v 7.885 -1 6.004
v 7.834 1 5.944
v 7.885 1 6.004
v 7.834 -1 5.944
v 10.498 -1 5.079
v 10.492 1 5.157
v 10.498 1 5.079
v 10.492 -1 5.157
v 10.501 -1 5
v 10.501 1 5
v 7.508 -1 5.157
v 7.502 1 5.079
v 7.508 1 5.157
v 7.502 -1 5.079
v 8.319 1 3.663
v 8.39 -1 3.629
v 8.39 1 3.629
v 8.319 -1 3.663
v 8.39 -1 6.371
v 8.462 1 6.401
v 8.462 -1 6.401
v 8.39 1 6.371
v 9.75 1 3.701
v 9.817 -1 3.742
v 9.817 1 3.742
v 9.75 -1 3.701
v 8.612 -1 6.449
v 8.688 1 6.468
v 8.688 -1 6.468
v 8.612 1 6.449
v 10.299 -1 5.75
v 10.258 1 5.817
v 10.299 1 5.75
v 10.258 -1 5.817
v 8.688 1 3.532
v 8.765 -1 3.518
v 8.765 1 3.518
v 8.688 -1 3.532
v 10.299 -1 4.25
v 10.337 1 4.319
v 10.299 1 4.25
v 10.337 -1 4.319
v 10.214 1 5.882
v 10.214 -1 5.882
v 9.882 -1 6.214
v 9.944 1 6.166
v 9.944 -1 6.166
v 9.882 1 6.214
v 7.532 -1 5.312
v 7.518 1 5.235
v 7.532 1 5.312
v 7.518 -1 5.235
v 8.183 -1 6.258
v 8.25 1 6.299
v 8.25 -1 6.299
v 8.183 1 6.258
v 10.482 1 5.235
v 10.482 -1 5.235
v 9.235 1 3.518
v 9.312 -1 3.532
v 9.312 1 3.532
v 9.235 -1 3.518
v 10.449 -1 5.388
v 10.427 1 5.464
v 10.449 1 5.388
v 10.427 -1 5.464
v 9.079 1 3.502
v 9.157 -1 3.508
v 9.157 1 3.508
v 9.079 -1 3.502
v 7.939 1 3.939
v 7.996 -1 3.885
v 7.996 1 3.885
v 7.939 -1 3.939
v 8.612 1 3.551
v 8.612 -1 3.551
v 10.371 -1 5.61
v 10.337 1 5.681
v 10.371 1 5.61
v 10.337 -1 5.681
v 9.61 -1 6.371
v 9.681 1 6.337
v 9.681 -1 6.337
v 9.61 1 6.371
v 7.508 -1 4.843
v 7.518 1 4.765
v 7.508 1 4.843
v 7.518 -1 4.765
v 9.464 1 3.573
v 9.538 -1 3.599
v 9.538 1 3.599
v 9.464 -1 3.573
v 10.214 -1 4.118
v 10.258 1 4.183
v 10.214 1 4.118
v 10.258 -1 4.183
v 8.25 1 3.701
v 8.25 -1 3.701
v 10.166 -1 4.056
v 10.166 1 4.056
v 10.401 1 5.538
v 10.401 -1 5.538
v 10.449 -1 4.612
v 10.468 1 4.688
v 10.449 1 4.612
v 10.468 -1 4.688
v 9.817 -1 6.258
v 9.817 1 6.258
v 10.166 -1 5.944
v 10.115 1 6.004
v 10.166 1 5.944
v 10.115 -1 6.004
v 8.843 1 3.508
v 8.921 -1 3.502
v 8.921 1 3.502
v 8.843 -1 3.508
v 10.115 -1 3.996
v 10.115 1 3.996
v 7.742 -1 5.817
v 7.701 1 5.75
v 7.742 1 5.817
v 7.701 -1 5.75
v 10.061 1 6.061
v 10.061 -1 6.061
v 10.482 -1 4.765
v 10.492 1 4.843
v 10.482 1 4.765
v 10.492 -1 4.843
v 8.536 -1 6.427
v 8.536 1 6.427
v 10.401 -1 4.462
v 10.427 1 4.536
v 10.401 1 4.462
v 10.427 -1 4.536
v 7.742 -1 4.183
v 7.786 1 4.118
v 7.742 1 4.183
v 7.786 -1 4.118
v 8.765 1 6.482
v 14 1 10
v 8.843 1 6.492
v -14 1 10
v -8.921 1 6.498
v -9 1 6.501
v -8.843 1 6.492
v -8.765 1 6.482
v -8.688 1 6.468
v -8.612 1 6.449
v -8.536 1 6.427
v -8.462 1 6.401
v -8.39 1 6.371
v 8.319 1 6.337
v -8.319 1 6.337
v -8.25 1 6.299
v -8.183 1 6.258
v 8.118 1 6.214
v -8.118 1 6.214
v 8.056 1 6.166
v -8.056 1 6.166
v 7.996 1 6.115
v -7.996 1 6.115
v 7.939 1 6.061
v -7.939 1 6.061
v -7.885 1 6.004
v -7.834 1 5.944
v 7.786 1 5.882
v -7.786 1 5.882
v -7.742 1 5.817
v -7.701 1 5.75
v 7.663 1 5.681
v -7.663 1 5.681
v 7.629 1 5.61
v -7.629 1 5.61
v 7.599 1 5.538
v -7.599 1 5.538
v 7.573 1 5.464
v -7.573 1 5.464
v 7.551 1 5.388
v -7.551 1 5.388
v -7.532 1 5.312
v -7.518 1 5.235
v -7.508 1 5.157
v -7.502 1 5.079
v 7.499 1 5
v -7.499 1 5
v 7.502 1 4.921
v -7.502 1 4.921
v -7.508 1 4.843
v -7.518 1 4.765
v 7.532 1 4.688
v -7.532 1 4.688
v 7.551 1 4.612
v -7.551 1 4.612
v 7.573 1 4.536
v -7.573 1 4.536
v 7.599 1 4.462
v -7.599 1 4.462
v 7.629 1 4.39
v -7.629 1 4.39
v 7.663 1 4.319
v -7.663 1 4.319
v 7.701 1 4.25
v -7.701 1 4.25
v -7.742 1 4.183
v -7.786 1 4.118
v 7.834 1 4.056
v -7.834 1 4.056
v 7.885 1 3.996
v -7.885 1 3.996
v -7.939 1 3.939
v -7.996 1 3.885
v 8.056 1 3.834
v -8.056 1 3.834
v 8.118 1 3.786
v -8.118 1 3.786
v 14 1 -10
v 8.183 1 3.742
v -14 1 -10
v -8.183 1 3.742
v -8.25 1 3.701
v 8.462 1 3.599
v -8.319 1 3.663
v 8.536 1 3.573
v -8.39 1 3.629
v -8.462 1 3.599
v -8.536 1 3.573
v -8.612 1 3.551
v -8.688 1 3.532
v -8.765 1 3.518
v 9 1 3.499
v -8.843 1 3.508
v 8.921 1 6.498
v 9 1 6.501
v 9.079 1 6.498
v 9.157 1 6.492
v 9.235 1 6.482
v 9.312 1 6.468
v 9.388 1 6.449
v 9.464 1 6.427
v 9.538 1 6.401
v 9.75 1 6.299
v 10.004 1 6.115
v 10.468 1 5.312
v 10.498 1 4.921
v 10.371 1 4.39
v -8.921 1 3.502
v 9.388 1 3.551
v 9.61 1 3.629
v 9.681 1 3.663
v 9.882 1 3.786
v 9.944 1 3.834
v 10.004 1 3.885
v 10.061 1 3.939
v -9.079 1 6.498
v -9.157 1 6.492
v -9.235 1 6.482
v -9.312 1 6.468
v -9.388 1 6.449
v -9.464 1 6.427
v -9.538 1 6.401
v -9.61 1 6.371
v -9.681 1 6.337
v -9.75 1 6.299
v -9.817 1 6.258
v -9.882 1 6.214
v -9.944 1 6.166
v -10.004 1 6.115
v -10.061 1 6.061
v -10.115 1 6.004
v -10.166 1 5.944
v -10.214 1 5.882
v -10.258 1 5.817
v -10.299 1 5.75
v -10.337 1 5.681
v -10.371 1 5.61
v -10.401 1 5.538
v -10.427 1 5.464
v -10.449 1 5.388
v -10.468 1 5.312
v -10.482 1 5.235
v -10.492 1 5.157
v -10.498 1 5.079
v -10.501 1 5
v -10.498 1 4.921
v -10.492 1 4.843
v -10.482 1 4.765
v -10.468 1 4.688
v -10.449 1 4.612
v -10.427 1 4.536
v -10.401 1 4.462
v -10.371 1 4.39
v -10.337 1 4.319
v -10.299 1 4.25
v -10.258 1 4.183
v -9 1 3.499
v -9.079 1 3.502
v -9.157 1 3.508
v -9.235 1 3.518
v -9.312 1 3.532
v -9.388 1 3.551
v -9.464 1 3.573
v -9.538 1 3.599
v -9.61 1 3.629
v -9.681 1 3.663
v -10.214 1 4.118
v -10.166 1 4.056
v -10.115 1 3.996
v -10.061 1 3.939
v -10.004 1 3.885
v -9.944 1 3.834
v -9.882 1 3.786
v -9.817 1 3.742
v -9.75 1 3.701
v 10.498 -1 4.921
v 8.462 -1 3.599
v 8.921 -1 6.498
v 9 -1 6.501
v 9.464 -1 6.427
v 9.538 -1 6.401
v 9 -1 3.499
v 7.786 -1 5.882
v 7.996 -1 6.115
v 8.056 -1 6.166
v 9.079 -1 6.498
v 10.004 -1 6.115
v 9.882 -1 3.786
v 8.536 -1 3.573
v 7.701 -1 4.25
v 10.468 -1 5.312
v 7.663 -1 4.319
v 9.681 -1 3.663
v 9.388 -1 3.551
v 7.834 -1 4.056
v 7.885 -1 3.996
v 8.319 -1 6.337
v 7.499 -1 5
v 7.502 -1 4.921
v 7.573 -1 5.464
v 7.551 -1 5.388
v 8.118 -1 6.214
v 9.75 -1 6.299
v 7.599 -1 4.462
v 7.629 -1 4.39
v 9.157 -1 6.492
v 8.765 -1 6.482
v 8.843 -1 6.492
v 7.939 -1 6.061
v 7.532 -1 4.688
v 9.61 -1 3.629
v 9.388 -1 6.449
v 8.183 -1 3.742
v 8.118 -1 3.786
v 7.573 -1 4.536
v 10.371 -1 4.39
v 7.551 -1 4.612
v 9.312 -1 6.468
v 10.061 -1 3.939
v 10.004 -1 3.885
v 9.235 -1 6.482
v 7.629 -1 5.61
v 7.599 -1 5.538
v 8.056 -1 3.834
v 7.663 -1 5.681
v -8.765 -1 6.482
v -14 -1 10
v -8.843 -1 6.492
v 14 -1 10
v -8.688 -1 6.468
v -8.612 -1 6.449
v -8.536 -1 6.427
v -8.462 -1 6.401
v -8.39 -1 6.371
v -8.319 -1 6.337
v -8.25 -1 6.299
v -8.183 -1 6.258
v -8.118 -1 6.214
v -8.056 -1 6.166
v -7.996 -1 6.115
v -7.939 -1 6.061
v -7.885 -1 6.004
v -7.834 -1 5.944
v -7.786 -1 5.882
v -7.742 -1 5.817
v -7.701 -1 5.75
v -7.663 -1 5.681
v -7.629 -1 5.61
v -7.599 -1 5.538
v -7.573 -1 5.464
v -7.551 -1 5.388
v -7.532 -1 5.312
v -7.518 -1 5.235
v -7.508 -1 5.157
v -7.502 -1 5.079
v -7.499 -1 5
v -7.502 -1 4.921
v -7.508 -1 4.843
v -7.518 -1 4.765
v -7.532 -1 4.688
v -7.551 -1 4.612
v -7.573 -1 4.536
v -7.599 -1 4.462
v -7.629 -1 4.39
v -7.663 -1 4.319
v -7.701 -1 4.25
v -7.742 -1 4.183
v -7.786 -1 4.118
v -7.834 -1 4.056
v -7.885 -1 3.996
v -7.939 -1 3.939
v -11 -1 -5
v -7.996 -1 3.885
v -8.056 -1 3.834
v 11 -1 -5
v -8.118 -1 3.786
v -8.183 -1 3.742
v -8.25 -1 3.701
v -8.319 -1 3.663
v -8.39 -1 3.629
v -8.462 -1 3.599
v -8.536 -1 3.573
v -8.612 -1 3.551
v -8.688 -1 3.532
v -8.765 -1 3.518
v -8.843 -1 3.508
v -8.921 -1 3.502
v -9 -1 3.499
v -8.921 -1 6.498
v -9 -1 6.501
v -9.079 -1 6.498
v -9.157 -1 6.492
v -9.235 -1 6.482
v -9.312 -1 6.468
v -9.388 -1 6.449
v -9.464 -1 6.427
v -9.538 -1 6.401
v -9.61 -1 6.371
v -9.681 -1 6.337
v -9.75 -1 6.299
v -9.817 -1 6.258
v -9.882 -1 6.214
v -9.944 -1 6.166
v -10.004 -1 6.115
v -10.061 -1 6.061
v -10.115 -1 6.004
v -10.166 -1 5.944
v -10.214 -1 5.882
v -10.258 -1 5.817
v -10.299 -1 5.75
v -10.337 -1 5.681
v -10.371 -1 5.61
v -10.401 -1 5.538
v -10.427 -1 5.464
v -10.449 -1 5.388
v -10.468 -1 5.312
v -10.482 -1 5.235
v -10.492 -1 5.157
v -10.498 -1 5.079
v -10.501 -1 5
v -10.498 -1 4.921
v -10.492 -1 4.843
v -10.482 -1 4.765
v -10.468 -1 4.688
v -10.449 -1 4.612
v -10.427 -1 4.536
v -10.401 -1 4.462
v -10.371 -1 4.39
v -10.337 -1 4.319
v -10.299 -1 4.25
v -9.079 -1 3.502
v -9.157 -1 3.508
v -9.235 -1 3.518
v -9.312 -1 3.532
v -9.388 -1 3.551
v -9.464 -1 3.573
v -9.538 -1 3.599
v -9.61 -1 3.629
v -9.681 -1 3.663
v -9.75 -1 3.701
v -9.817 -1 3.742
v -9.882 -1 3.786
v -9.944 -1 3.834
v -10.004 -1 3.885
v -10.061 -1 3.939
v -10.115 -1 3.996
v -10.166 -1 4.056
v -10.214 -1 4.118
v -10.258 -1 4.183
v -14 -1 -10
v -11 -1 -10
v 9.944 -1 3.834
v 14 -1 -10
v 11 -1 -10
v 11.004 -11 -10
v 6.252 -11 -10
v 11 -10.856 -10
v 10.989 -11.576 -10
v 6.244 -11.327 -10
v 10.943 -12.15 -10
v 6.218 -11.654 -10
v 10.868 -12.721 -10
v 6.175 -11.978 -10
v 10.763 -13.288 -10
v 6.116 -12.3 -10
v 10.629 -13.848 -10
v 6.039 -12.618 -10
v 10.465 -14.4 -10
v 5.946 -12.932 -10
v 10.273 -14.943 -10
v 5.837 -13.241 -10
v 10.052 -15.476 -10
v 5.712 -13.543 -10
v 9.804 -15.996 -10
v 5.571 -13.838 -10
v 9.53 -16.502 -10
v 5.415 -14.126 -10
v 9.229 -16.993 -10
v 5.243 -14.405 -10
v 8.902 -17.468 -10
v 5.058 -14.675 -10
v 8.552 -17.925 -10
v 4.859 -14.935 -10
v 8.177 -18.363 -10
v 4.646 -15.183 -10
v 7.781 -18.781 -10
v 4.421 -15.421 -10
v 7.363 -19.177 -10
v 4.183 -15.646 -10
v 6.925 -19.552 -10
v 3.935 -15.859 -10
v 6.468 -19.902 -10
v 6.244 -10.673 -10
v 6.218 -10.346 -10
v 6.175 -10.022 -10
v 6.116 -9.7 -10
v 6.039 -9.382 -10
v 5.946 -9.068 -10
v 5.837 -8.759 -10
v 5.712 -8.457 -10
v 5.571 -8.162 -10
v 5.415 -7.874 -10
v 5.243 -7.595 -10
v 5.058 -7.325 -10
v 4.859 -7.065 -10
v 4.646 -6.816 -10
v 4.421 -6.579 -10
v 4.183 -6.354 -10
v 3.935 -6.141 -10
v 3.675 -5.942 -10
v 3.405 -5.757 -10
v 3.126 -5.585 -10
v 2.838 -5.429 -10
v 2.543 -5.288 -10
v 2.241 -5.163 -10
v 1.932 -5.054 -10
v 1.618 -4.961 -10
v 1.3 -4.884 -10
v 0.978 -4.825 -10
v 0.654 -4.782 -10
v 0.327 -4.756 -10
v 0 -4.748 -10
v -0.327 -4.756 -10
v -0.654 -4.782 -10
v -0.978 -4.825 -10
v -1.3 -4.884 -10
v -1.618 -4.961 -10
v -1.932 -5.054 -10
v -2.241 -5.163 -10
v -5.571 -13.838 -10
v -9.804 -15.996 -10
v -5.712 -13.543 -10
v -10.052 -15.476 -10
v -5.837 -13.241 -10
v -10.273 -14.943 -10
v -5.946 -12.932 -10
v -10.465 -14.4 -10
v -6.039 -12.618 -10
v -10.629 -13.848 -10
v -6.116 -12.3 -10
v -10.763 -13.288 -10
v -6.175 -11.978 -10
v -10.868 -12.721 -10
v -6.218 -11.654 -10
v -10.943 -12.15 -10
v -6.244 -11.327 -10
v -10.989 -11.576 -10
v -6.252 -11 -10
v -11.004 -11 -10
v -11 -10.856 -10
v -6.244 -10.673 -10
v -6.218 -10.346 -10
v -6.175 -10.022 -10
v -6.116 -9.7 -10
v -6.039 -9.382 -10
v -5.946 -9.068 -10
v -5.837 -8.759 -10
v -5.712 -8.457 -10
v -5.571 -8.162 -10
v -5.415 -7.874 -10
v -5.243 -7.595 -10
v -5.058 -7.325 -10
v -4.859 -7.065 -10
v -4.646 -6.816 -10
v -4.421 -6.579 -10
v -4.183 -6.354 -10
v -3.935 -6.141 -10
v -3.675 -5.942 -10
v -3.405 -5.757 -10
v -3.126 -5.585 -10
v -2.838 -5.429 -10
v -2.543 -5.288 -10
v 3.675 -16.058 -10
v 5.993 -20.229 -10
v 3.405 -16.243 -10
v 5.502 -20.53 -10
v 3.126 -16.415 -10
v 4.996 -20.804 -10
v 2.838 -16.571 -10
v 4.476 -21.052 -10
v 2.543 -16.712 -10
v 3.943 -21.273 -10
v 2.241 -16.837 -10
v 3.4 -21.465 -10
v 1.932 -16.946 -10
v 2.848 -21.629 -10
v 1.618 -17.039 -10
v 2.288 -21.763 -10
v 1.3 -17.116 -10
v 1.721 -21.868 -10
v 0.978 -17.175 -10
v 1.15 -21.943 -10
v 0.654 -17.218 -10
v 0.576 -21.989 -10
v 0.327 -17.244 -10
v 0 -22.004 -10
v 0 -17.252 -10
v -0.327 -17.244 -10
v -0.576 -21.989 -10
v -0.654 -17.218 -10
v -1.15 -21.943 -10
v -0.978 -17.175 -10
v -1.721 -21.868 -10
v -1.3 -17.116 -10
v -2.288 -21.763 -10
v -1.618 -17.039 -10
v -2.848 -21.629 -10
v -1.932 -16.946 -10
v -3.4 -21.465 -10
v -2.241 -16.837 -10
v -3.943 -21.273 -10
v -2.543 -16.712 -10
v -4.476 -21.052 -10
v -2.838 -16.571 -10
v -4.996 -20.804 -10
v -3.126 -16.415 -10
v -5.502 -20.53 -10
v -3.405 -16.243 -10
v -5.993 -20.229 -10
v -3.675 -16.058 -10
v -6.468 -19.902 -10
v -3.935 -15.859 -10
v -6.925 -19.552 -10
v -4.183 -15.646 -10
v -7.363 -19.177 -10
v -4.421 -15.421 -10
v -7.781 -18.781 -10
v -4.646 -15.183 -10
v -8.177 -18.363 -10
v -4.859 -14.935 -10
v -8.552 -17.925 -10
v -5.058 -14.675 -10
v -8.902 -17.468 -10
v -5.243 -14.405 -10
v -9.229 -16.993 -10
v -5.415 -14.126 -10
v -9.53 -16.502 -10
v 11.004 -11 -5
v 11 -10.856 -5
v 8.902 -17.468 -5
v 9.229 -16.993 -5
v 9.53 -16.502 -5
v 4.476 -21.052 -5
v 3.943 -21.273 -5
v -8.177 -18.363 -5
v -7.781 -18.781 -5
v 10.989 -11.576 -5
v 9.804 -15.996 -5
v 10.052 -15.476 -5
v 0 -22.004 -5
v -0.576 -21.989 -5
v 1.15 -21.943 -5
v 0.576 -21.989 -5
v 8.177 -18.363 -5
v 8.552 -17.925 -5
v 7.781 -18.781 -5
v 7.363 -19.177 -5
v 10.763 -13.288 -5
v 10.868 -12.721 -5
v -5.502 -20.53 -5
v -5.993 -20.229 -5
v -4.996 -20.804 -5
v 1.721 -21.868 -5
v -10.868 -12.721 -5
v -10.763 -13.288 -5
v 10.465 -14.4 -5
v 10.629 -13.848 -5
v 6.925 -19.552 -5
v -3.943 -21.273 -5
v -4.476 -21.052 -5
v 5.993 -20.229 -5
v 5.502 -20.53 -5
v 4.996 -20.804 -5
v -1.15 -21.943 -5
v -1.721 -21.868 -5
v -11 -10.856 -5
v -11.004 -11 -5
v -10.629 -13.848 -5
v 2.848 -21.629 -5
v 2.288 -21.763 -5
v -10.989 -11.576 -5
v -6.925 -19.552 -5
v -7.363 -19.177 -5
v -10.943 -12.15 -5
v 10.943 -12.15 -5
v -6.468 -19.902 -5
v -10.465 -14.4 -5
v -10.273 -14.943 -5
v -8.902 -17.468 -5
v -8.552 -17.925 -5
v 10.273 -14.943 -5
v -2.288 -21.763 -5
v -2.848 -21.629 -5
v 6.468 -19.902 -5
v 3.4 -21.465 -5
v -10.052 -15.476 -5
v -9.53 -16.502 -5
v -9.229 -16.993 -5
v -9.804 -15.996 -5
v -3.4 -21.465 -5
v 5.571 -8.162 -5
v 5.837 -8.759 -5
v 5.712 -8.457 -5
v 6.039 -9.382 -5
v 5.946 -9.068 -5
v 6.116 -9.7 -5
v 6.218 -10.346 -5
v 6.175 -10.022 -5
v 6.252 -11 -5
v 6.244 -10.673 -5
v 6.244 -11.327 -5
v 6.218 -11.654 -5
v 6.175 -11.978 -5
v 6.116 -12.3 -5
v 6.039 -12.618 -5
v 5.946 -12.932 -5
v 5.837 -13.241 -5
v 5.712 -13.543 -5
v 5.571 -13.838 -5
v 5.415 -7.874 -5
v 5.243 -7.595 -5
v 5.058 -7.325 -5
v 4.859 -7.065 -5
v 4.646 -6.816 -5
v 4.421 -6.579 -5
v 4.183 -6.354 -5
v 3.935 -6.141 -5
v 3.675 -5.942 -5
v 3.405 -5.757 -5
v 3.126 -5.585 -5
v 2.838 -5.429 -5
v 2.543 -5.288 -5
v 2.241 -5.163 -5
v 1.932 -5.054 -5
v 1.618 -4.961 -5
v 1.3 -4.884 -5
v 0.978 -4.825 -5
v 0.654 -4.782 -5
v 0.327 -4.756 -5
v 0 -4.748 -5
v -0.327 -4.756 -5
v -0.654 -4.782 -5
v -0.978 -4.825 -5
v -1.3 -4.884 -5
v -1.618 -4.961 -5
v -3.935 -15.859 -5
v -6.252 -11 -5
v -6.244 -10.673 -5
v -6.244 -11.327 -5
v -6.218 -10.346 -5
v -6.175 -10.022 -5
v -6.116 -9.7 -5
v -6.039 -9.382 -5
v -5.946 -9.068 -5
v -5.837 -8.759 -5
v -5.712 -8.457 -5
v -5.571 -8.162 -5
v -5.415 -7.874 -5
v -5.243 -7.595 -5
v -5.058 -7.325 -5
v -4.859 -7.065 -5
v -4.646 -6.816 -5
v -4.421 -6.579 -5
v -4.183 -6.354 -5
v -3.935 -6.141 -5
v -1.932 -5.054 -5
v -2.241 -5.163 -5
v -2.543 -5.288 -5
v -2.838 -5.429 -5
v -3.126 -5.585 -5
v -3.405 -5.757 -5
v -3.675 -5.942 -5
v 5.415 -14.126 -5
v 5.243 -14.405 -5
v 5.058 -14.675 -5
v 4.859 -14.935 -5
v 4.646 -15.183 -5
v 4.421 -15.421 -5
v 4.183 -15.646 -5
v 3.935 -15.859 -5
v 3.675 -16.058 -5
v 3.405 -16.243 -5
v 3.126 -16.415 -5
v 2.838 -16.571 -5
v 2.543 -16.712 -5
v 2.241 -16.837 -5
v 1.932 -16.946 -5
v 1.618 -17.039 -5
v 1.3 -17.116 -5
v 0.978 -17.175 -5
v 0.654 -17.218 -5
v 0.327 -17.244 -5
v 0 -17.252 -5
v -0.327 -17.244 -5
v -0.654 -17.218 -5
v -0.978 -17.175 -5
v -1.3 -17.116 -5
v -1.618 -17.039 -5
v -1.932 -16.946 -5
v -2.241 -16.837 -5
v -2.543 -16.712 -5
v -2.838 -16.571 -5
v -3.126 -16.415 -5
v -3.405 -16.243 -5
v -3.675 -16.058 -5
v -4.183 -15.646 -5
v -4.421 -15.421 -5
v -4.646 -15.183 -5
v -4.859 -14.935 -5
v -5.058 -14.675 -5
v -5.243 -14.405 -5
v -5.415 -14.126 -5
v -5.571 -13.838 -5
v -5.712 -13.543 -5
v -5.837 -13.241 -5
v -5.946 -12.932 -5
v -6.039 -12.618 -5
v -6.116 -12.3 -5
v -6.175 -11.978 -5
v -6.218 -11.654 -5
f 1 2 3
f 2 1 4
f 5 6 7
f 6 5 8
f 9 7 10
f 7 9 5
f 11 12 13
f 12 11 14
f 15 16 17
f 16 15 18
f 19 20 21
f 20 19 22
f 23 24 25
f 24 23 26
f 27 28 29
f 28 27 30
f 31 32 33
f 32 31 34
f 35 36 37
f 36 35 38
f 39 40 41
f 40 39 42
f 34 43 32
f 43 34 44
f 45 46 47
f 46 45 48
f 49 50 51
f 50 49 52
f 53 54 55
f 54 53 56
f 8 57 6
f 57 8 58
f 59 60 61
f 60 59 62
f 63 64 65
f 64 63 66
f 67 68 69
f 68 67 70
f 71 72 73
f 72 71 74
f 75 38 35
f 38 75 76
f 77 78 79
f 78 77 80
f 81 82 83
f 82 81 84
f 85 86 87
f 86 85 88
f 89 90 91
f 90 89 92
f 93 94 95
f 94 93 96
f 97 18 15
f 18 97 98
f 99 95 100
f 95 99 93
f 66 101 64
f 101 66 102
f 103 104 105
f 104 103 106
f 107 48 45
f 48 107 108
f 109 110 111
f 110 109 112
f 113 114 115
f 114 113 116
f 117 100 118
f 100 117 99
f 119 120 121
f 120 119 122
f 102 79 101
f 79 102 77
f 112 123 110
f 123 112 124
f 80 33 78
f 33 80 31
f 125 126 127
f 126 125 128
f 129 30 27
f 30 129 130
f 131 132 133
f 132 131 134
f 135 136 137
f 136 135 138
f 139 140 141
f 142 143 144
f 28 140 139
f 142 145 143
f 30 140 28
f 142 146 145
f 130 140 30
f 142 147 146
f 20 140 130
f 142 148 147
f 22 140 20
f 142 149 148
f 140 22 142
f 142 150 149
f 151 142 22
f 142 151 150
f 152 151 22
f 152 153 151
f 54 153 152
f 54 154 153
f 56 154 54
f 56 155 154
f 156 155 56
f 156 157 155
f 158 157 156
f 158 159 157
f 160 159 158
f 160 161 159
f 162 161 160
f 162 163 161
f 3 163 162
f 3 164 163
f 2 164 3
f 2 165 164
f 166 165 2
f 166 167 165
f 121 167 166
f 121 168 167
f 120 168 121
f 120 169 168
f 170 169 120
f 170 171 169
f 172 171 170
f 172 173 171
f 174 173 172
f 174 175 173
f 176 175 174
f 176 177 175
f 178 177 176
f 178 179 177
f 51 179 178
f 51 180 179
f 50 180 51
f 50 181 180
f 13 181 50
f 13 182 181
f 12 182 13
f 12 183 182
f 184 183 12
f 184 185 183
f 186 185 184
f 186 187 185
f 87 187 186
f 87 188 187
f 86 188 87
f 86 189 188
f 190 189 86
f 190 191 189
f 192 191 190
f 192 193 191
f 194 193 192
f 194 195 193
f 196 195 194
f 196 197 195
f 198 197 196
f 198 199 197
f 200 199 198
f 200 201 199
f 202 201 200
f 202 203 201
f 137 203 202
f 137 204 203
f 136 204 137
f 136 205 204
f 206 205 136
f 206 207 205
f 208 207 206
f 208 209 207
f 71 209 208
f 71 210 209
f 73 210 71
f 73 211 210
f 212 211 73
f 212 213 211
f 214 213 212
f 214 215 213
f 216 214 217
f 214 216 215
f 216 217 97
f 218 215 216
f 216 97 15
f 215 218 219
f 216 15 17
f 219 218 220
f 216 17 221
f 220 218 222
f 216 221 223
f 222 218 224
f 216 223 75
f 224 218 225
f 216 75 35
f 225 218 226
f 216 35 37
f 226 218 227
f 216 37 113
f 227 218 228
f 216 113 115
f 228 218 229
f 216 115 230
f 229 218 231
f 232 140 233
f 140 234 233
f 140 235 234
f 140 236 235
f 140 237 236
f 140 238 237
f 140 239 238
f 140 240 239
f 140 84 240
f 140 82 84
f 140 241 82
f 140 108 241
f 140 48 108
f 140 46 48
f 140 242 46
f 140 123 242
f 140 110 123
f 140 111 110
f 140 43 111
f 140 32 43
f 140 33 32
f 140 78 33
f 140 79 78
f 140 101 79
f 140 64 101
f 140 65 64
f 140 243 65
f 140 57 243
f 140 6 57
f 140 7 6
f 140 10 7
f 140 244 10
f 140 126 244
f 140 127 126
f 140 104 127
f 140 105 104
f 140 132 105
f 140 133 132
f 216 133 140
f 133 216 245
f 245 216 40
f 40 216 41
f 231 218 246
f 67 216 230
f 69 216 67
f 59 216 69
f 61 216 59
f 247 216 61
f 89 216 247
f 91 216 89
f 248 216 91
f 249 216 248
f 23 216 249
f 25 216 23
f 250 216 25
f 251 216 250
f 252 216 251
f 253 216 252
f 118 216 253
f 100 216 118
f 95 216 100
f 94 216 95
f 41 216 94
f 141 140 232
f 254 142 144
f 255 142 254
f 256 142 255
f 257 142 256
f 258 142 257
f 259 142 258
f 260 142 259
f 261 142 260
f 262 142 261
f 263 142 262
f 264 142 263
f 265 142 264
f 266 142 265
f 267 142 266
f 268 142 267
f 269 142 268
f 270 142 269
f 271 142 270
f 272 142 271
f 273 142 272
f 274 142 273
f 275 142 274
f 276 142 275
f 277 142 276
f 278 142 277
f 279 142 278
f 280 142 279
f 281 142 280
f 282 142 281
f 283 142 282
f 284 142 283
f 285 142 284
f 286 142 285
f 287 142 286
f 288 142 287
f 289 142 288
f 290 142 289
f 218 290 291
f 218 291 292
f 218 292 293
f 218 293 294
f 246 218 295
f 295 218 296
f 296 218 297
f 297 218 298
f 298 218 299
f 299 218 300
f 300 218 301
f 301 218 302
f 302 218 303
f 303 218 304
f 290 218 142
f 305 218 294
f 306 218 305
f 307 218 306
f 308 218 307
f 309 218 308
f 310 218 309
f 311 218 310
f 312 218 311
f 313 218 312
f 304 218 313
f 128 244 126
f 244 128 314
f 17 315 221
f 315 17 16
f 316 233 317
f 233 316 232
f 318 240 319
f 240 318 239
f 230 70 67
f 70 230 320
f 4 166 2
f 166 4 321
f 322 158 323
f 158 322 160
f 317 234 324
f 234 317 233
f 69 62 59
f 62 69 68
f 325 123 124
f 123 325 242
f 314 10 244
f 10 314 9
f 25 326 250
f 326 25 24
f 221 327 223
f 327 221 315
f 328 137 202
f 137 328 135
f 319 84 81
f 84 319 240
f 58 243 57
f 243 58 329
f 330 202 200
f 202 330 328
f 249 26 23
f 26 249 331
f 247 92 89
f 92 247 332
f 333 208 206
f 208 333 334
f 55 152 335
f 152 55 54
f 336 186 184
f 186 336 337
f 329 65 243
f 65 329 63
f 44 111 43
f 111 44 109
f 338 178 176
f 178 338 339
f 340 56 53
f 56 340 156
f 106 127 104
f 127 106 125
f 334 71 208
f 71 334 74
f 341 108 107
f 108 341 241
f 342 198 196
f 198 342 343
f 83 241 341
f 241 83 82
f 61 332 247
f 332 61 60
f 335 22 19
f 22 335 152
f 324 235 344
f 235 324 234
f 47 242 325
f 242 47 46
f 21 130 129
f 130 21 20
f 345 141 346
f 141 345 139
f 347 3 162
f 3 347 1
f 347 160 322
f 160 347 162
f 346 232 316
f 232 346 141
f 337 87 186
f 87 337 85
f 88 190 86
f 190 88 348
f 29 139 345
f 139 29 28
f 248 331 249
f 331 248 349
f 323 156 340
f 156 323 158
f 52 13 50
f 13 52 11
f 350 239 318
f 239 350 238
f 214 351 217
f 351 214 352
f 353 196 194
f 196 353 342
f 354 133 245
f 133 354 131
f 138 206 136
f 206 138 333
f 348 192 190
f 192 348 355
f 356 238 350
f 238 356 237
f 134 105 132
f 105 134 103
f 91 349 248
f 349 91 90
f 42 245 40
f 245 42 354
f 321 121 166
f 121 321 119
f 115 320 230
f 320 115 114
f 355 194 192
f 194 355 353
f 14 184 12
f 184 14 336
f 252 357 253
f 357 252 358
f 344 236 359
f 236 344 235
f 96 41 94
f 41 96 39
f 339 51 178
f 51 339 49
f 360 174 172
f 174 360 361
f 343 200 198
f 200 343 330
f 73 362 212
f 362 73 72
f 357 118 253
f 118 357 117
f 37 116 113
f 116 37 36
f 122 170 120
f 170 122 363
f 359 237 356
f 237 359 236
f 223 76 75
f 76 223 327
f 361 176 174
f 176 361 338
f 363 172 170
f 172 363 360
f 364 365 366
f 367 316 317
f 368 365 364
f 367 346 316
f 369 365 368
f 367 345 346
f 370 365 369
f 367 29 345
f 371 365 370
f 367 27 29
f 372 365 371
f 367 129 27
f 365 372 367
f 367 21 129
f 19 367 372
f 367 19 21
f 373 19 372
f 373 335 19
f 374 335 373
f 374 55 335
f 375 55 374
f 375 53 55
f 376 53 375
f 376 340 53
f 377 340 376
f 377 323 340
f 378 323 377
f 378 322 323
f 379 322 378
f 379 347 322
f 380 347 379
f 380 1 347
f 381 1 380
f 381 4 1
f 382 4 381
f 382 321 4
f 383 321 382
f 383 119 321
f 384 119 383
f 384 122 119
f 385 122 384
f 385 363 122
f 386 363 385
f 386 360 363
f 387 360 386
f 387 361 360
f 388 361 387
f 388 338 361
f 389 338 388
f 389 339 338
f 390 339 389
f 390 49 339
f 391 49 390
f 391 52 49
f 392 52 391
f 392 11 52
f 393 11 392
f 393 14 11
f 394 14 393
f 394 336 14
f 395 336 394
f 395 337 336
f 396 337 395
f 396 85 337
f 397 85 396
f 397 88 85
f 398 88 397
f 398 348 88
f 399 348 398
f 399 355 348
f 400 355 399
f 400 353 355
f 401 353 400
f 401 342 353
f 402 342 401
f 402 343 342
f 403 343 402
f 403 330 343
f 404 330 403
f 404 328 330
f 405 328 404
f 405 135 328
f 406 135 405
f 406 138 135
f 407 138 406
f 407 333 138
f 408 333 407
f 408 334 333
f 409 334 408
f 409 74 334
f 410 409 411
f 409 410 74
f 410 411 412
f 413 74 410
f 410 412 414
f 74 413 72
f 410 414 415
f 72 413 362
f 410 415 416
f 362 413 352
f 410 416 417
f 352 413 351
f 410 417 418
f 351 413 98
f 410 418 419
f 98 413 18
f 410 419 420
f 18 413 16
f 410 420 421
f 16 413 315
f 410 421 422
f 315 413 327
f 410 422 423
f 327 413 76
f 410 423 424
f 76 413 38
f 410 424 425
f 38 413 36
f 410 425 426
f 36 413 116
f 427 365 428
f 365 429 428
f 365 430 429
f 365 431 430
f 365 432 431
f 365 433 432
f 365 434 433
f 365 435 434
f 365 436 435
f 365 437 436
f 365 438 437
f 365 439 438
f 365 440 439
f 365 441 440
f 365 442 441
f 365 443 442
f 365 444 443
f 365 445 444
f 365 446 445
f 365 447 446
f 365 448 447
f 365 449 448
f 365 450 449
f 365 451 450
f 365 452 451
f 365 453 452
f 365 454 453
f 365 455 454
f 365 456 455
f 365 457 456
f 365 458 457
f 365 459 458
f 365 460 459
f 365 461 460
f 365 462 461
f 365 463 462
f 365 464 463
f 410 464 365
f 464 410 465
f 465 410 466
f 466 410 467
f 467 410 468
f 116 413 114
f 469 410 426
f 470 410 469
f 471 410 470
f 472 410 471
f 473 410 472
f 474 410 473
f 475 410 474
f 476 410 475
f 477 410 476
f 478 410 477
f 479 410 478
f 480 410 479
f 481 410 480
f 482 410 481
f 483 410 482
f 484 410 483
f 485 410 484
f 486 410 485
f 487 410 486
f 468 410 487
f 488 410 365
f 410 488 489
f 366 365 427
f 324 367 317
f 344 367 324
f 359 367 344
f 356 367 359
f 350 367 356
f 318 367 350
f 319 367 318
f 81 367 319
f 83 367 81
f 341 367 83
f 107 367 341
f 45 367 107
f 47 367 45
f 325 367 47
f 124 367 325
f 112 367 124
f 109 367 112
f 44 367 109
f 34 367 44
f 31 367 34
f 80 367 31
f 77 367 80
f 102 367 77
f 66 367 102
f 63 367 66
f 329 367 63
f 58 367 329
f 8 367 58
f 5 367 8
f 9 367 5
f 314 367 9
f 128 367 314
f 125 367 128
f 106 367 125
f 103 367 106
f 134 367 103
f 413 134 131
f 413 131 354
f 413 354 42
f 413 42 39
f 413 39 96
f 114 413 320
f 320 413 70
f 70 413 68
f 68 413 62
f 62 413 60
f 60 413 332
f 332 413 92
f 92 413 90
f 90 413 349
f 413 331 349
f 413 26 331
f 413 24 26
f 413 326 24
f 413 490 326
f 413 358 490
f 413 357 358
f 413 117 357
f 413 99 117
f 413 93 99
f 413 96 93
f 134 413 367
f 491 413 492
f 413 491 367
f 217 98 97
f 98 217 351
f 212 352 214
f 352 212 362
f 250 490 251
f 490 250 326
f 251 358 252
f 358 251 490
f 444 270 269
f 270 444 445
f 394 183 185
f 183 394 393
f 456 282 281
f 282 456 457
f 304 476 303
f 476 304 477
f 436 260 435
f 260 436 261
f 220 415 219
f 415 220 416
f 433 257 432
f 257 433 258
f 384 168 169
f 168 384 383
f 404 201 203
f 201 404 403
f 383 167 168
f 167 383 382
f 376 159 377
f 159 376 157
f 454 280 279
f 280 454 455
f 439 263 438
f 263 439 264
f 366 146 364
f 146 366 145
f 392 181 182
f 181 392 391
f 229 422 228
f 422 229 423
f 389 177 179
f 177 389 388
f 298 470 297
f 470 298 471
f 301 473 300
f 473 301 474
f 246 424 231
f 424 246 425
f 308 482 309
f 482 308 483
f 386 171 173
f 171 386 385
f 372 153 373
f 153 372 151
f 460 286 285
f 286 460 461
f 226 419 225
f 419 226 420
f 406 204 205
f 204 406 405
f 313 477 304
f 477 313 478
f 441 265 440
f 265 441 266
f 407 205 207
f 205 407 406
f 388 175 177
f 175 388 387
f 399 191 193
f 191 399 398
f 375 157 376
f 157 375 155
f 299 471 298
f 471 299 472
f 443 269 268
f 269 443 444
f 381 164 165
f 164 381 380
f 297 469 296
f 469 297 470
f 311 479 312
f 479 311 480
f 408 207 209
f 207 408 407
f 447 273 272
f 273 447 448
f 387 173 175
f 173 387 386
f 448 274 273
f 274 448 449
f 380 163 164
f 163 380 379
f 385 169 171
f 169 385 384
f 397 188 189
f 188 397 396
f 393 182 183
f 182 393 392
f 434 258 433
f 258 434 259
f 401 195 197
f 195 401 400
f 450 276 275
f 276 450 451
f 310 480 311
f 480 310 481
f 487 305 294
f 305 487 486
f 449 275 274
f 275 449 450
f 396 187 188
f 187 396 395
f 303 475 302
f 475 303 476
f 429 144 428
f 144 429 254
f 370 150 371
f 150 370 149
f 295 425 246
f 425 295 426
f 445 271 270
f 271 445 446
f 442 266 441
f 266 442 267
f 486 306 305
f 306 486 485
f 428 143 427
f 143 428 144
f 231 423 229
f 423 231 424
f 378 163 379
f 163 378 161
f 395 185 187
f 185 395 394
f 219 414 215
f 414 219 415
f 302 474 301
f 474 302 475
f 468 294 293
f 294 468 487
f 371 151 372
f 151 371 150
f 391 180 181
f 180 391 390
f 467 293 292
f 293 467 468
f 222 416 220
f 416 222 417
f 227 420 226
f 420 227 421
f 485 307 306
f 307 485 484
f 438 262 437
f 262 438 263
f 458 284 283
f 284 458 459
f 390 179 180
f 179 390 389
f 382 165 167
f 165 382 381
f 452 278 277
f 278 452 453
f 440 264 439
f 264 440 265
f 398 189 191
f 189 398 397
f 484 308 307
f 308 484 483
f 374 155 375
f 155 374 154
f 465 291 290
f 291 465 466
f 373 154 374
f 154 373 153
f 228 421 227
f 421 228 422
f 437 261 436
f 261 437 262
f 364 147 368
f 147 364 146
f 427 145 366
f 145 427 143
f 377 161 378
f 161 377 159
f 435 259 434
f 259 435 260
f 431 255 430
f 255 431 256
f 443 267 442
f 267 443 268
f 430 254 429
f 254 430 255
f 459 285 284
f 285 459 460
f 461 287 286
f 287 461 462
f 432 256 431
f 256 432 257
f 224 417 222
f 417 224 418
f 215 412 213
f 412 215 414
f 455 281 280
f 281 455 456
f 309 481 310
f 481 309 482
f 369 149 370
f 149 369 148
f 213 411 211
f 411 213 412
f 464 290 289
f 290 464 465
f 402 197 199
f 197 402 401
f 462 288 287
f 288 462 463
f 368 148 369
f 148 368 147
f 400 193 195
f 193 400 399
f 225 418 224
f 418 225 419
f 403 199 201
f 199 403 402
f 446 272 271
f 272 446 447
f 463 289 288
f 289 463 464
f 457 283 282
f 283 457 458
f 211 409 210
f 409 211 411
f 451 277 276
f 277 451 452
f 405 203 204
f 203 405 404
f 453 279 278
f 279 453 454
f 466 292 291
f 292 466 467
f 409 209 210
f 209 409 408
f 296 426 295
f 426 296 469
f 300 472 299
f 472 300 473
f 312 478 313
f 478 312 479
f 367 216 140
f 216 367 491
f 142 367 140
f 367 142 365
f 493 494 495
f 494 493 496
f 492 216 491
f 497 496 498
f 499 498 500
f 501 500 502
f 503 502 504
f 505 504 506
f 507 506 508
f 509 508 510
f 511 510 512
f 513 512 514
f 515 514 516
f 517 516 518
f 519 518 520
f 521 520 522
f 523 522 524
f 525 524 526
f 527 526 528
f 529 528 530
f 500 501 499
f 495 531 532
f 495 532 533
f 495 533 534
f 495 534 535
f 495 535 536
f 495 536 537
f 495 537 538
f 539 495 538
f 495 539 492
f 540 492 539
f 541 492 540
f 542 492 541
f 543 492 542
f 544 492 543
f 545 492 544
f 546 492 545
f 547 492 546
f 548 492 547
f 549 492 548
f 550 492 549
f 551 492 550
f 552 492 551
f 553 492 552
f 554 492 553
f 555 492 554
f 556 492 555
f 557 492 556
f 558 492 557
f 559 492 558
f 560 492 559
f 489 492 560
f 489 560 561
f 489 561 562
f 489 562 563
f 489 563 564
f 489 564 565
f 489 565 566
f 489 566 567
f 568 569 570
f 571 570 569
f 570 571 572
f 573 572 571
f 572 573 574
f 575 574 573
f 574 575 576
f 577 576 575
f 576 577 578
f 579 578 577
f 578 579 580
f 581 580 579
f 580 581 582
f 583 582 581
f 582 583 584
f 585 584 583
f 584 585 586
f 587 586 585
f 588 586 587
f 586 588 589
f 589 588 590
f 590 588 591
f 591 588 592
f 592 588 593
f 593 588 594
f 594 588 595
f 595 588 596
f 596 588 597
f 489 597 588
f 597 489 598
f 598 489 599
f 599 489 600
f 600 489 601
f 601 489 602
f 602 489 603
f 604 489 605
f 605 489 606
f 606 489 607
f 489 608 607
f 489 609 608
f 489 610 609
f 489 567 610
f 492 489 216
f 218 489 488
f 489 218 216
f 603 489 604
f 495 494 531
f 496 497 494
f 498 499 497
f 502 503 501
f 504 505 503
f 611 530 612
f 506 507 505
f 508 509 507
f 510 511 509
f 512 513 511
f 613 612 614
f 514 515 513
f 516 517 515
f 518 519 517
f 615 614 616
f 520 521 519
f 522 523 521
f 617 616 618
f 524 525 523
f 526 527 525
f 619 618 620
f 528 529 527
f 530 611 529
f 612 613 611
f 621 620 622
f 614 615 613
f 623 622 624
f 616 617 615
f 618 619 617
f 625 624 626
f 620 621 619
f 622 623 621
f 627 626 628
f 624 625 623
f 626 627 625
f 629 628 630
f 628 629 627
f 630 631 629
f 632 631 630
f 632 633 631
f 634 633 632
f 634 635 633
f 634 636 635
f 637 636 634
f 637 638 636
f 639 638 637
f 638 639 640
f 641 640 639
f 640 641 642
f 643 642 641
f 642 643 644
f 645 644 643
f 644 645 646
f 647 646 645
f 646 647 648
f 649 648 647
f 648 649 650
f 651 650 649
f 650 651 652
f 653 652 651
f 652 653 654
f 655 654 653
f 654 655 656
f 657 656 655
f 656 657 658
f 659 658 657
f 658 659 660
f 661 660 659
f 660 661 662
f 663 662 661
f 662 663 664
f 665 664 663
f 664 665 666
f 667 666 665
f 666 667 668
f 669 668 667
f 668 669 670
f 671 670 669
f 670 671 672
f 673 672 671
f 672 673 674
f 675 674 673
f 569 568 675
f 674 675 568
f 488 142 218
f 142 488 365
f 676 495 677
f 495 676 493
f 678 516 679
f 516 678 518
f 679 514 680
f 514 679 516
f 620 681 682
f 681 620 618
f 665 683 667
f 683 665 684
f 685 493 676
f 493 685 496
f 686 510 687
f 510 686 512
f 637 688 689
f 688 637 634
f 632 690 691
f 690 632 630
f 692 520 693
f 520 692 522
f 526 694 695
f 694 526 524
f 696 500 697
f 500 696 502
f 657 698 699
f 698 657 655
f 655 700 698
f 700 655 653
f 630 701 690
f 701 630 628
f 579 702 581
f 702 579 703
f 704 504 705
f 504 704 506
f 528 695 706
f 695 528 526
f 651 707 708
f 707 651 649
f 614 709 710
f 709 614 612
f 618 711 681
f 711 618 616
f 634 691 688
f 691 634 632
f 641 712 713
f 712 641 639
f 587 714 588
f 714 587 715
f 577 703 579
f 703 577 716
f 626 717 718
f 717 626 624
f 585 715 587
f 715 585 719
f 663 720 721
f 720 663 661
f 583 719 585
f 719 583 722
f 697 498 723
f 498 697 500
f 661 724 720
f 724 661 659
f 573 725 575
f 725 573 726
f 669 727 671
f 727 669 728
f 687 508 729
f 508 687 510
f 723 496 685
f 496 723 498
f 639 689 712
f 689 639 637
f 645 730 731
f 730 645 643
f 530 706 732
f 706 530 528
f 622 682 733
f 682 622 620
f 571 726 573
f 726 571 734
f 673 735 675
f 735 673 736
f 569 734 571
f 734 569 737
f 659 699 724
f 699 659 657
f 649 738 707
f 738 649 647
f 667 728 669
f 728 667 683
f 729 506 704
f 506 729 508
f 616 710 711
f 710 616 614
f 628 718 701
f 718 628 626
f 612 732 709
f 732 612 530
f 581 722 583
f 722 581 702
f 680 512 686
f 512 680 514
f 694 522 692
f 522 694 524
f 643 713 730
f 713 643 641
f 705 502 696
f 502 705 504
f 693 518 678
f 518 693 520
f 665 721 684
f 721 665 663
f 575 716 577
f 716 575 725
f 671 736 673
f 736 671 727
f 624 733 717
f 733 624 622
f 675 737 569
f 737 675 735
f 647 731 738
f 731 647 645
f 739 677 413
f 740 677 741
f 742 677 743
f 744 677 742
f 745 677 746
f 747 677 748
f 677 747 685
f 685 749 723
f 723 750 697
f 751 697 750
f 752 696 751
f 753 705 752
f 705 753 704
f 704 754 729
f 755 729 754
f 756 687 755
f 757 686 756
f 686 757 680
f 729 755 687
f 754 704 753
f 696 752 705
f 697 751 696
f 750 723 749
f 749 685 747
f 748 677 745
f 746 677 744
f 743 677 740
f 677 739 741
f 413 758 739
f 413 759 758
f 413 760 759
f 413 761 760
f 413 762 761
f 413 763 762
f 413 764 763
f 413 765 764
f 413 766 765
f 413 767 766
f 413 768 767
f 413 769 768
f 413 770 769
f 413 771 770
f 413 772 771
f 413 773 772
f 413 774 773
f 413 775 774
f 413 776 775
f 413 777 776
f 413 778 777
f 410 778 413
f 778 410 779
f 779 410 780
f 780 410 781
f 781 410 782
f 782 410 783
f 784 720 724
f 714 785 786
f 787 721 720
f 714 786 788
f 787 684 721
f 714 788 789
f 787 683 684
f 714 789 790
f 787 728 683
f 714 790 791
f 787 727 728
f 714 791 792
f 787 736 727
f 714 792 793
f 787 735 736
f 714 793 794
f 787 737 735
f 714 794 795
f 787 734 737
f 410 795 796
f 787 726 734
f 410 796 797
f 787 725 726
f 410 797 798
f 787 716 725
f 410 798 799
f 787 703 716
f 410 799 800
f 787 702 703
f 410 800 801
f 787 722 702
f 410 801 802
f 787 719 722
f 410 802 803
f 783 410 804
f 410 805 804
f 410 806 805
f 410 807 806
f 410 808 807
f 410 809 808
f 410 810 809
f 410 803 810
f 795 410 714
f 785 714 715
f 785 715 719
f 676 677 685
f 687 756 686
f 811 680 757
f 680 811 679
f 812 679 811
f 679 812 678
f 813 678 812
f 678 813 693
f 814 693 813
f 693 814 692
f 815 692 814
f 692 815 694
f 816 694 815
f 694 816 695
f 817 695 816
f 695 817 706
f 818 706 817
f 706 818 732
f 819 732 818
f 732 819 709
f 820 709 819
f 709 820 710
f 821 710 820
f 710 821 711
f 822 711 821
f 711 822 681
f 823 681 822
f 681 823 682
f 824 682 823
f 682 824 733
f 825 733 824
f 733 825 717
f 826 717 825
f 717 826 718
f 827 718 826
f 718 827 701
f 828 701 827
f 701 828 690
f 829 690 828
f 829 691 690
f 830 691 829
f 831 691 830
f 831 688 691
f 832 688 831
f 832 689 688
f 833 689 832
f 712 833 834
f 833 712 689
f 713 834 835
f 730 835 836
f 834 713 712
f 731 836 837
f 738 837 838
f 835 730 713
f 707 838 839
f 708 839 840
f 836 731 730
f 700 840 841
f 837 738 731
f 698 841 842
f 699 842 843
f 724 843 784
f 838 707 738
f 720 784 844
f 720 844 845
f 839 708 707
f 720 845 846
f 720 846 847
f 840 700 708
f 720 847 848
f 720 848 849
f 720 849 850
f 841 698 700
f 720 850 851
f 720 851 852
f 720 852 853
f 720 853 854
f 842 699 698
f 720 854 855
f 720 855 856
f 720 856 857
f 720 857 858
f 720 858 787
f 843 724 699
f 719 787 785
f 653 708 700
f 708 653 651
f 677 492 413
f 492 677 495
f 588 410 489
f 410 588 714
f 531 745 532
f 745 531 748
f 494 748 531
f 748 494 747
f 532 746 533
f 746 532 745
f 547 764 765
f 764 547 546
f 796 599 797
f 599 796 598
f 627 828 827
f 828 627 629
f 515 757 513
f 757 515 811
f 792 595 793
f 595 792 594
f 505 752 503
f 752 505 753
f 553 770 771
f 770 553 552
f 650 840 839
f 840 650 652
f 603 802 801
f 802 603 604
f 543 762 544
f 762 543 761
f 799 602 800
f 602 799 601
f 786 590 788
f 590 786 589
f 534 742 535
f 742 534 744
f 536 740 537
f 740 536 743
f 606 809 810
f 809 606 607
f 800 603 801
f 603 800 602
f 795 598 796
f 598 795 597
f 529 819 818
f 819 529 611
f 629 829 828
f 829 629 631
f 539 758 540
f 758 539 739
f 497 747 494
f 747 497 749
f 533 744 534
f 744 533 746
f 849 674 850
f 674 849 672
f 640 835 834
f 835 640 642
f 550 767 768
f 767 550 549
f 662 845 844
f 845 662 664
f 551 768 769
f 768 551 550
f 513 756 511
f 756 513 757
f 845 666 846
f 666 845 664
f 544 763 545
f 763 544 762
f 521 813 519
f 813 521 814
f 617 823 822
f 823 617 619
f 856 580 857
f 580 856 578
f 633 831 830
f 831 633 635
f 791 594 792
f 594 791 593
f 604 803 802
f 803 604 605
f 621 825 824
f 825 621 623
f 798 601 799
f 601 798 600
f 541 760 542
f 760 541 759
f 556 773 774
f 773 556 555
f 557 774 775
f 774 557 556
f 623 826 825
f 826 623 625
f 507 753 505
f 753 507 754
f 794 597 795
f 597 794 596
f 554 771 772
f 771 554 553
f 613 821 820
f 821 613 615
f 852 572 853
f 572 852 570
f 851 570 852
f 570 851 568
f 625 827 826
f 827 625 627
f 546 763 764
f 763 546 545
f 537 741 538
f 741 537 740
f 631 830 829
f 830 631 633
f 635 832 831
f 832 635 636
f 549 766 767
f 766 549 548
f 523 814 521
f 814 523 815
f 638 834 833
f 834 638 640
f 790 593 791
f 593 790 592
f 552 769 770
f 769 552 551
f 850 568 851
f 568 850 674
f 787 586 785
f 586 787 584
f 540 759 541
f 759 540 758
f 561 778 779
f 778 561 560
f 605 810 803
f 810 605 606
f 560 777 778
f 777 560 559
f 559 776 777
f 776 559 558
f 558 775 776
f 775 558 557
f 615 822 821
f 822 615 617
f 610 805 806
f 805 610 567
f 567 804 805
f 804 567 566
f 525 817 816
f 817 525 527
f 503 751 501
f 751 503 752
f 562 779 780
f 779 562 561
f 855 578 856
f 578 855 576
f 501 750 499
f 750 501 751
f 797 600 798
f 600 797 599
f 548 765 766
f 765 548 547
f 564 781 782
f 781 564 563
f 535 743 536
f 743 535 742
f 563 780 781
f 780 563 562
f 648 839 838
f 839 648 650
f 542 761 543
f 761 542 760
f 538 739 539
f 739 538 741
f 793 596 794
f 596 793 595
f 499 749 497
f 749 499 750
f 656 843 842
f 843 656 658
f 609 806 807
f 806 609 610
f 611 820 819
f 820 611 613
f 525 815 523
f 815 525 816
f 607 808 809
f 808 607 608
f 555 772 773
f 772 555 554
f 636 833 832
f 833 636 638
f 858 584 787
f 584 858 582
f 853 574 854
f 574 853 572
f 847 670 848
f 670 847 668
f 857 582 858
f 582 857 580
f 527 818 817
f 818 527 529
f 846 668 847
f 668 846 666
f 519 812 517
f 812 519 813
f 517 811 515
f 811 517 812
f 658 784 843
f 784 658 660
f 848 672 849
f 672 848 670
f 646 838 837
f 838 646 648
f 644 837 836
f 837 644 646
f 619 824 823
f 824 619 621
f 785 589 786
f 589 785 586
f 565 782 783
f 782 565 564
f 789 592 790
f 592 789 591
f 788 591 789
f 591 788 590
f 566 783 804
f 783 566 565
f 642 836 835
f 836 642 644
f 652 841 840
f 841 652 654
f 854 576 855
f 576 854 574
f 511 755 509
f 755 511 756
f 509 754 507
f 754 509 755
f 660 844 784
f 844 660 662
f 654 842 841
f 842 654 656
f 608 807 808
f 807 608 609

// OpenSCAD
// Customizable Probe Mount
// Copyright: Olle Johansson 2018
// License: CC BY-SA

//CUSTOMIZER VARIABLES

width = 28;
height = 20;
thickness = 2;
probe_hole_diameter = 12.5;
probe_mount_thickness = 5;
probe_mount_diameter = 22;
distance_to_probe_hole_center = 10;
mount_hole_diameter = 3;
mount_hole_distance = 5;

//CUSTOMIZER VARIABLES END

/* [Hidden] */

$fn=120;

module cylinder_outer(height, diameter, fn) {
   fudge = 1 / cos(180 / fn);
   cylinder(h=height, r=diameter / 2 * fudge, $fn=fn, center=true);
}

module rectangle_rounded(width, height, radius=1) {
	minkowski() {
		circle(r = radius);
		square([width - 2 * radius, height - 2 * radius], center = true);
	}
}

module mount_holes() {
    #translate([width/2 - mount_hole_distance, 0, height/2 - mount_hole_distance])
        rotate([90, 0, 0])
        cylinder_outer(thickness, mount_hole_diameter, $fn);
    #translate([- width/2 + mount_hole_distance, 0, height/2 - mount_hole_distance])
        rotate([90, 0, 0])
        cylinder_outer(thickness, mount_hole_diameter, $fn);
}

module backplate() {
    difference() {
        cube([width, thickness, height], center = true);
        
        mount_holes();
    }
}

module mount() {
    translate([0, 0, probe_mount_thickness/2 - height/2])
    difference() {
        union() {
            translate([0, -probe_mount_diameter/2, 0])
            cylinder_outer(probe_mount_thickness, probe_mount_diameter, $fn);
            
            translate([0, -probe_mount_diameter/4, 0])
            cube([probe_mount_diameter, probe_mount_diameter/2, probe_mount_thickness], center=true);
        }
        
        #translate([0, -probe_mount_diameter/2, 0])
        cylinder_outer(probe_mount_thickness, probe_hole_diameter, $fn);
    }
}

module probe_mount() {
    backplate();
    mount();
}

probe_mount();
